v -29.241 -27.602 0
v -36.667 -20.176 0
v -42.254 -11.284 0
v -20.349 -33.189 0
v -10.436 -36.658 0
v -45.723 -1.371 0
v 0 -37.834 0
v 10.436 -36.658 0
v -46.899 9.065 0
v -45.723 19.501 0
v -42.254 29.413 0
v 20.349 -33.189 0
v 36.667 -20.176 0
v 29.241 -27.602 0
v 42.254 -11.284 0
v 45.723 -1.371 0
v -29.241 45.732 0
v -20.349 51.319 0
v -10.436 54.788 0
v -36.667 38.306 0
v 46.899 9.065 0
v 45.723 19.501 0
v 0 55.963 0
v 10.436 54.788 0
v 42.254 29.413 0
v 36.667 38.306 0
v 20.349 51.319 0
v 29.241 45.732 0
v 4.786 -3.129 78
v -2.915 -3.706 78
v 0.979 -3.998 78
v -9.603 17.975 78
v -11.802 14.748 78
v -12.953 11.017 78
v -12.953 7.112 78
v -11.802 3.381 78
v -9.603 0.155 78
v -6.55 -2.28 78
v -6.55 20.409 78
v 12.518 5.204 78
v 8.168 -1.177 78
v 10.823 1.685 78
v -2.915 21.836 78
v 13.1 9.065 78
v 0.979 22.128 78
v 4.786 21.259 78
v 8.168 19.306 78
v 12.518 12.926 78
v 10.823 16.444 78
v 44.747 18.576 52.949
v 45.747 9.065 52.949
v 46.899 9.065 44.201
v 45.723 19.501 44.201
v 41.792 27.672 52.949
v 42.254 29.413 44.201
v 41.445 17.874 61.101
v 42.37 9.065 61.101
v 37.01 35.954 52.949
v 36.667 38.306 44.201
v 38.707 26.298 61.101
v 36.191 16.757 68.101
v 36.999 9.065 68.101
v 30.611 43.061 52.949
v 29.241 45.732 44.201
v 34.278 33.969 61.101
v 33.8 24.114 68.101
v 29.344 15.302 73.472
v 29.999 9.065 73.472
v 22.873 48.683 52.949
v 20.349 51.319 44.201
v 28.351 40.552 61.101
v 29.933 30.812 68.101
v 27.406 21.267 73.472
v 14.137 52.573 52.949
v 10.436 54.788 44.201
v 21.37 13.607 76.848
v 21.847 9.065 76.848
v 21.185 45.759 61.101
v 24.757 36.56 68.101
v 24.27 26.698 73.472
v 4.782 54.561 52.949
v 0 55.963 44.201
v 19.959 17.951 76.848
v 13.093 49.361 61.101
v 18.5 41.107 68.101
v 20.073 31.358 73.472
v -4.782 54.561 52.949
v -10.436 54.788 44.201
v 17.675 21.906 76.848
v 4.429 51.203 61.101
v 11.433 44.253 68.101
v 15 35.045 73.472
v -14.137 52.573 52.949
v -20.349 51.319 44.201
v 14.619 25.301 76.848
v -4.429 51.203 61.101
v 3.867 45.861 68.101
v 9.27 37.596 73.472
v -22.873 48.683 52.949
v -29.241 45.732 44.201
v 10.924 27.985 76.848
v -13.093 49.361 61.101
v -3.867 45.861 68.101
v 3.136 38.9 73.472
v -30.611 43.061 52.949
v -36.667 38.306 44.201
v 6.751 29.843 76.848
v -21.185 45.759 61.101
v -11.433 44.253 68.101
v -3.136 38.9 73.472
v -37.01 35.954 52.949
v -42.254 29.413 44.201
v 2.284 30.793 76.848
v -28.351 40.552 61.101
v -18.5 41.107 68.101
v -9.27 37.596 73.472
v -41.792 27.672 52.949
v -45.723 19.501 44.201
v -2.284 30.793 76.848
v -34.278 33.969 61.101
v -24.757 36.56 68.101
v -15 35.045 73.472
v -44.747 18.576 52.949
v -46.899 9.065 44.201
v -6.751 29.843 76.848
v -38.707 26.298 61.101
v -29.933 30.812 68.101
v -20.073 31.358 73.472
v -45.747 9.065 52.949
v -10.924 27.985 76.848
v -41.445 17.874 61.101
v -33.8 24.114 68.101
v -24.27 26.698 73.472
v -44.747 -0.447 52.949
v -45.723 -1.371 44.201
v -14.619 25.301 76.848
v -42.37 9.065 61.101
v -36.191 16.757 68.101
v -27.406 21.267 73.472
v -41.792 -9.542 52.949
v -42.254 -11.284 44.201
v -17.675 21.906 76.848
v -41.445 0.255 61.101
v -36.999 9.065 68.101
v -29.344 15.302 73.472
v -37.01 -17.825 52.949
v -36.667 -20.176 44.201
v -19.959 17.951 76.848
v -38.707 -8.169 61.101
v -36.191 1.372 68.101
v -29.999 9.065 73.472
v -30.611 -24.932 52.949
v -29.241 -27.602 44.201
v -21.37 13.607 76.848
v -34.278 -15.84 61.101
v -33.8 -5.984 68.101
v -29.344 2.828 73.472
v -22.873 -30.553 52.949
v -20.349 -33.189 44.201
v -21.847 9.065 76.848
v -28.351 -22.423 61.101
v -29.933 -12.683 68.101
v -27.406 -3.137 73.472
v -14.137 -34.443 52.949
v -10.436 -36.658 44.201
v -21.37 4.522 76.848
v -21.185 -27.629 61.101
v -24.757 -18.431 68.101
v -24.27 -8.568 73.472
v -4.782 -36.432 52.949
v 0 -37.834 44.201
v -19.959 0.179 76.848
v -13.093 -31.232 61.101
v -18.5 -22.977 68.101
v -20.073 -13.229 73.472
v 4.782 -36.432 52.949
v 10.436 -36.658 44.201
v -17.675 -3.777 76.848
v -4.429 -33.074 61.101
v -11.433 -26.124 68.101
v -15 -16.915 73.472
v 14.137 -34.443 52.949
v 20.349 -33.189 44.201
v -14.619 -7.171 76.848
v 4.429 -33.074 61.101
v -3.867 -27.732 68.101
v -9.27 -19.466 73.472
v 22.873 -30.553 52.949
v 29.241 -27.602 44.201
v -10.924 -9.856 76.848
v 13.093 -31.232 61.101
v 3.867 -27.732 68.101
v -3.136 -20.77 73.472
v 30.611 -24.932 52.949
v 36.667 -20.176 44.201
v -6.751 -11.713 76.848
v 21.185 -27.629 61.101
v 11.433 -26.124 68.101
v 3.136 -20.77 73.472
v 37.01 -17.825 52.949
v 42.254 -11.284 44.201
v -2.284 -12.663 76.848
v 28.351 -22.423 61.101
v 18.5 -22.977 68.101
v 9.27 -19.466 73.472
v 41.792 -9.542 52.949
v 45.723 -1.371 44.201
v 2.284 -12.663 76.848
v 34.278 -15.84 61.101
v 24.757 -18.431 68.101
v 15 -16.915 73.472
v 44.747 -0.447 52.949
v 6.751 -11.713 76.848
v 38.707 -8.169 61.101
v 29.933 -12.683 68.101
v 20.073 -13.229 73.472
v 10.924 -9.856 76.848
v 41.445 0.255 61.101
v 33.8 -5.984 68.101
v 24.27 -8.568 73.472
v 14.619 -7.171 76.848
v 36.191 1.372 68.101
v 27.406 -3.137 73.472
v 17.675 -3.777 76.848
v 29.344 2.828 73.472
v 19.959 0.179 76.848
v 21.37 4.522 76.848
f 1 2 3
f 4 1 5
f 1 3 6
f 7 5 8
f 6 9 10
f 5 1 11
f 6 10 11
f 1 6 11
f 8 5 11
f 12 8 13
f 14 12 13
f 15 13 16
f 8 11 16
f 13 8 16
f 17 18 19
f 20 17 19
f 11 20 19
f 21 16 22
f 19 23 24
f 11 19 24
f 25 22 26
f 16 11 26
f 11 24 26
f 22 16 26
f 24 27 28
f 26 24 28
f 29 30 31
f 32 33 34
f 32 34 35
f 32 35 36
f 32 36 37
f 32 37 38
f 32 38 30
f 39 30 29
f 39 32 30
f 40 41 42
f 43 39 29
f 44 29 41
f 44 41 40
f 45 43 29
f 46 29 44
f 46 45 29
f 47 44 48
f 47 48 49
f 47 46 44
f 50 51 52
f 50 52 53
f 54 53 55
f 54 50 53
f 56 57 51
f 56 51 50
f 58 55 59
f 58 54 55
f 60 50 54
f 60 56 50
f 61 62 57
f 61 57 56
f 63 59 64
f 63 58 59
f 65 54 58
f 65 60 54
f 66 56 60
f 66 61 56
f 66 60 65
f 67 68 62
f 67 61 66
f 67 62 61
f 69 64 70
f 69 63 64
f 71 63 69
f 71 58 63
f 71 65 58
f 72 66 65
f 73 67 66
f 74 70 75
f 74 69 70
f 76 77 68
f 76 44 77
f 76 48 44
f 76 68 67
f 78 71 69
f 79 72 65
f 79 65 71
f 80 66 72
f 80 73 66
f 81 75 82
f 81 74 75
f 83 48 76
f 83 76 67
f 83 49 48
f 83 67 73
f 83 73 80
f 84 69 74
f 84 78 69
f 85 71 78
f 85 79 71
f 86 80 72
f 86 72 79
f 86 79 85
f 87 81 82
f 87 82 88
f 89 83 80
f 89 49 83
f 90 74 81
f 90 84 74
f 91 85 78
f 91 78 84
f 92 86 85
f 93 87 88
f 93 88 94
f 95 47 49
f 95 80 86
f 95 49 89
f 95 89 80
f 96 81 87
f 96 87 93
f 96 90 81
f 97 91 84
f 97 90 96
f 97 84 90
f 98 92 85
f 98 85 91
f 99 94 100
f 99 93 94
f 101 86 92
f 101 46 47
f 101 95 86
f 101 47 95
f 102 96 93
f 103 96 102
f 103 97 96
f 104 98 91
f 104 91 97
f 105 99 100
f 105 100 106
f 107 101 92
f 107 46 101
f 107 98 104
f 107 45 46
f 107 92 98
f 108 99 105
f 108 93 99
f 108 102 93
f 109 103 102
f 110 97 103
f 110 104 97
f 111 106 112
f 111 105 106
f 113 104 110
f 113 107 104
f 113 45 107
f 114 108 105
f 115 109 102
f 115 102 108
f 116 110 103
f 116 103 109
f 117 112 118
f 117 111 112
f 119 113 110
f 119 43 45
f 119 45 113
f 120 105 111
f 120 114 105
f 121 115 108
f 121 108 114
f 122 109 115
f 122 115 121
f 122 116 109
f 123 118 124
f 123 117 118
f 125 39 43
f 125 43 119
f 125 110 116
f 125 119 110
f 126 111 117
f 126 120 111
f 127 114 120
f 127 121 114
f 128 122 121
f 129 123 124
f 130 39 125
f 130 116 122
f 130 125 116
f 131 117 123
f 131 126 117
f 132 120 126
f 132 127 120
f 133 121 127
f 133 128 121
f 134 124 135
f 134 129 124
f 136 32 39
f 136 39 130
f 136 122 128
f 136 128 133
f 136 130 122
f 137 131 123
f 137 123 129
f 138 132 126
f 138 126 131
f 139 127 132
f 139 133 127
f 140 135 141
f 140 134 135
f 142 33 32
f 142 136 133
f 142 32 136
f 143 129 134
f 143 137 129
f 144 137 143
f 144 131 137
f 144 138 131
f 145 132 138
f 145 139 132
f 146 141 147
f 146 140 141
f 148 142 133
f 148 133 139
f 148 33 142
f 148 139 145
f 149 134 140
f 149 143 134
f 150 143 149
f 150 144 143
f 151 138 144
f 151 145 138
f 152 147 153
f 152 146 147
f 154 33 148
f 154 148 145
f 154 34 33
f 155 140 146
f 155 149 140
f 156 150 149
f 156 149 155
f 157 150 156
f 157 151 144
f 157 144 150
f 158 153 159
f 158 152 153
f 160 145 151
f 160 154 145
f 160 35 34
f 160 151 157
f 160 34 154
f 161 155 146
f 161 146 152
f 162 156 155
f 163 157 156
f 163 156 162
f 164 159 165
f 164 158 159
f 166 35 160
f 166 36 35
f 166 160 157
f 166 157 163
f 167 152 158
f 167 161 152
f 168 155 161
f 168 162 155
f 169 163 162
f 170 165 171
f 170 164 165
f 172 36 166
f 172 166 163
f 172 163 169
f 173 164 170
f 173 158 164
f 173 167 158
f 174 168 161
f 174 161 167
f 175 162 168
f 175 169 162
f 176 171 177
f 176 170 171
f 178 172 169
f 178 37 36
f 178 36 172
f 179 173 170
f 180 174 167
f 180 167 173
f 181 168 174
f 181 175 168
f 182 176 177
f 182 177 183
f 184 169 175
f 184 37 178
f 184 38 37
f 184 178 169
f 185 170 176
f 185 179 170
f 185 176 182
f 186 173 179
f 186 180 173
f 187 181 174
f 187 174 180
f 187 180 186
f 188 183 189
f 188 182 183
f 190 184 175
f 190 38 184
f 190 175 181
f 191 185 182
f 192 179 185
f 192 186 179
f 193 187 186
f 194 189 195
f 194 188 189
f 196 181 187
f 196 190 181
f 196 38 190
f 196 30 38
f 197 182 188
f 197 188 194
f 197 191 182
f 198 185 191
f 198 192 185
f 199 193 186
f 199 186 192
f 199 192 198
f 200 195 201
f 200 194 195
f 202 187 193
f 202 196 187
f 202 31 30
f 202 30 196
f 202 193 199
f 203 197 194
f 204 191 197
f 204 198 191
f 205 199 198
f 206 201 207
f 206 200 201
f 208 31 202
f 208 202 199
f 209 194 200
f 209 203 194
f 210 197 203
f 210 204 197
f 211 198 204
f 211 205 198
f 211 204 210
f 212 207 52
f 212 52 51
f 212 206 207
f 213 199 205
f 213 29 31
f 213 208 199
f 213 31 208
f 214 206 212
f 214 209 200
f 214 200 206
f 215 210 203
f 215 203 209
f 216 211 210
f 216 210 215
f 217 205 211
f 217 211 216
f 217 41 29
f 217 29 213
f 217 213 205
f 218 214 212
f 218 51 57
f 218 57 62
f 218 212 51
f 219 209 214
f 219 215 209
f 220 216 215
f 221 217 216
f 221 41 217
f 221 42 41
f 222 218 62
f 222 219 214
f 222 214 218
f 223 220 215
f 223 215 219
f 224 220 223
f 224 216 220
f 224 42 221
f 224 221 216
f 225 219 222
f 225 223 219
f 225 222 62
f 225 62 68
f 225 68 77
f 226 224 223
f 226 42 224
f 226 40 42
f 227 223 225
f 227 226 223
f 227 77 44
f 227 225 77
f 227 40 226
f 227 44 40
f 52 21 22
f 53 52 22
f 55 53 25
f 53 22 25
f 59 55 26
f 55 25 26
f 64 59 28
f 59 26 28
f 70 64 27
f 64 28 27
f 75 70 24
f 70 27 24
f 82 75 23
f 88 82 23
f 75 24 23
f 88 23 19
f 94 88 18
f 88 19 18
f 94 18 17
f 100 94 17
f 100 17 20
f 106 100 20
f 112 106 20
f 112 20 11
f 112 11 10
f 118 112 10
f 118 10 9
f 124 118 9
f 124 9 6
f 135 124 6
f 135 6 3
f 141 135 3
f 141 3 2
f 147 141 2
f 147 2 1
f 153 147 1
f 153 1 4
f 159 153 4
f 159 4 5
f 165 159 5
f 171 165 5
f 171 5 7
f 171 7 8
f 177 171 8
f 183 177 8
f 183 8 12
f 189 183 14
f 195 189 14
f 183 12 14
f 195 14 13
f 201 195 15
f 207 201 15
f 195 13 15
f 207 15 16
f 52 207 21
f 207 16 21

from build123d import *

# Parameters (mm, degrees)
F0_R     = 46.8986478897
F1_DEPTH = 25
F2_DEPTH = 53
F3_R     = 33.7989898732


with BuildPart() as f1:
    # F0 (on Top) → F1 (new body)
    with BuildSketch(Plane.XY):
        with Locations((0, 9.0647488832)):
            Circle(F0_R)
    extrude(amount=F1_DEPTH)

    # F2 (add): a face of the model
    f2_faces = [f1.faces().sort_by_distance(p)[0] for p in [
        (0, 9.0647488832, 25),
    ]]
    extrude(f2_faces, amount=F2_DEPTH)

    # F3
    f3_edges = [f1.edges().sort_by_distance(p)[0] for p in [
        (-46.898648, 9.064749, 78),
    ]]
    fillet(f3_edges, radius=F3_R)


solid = f1.part
